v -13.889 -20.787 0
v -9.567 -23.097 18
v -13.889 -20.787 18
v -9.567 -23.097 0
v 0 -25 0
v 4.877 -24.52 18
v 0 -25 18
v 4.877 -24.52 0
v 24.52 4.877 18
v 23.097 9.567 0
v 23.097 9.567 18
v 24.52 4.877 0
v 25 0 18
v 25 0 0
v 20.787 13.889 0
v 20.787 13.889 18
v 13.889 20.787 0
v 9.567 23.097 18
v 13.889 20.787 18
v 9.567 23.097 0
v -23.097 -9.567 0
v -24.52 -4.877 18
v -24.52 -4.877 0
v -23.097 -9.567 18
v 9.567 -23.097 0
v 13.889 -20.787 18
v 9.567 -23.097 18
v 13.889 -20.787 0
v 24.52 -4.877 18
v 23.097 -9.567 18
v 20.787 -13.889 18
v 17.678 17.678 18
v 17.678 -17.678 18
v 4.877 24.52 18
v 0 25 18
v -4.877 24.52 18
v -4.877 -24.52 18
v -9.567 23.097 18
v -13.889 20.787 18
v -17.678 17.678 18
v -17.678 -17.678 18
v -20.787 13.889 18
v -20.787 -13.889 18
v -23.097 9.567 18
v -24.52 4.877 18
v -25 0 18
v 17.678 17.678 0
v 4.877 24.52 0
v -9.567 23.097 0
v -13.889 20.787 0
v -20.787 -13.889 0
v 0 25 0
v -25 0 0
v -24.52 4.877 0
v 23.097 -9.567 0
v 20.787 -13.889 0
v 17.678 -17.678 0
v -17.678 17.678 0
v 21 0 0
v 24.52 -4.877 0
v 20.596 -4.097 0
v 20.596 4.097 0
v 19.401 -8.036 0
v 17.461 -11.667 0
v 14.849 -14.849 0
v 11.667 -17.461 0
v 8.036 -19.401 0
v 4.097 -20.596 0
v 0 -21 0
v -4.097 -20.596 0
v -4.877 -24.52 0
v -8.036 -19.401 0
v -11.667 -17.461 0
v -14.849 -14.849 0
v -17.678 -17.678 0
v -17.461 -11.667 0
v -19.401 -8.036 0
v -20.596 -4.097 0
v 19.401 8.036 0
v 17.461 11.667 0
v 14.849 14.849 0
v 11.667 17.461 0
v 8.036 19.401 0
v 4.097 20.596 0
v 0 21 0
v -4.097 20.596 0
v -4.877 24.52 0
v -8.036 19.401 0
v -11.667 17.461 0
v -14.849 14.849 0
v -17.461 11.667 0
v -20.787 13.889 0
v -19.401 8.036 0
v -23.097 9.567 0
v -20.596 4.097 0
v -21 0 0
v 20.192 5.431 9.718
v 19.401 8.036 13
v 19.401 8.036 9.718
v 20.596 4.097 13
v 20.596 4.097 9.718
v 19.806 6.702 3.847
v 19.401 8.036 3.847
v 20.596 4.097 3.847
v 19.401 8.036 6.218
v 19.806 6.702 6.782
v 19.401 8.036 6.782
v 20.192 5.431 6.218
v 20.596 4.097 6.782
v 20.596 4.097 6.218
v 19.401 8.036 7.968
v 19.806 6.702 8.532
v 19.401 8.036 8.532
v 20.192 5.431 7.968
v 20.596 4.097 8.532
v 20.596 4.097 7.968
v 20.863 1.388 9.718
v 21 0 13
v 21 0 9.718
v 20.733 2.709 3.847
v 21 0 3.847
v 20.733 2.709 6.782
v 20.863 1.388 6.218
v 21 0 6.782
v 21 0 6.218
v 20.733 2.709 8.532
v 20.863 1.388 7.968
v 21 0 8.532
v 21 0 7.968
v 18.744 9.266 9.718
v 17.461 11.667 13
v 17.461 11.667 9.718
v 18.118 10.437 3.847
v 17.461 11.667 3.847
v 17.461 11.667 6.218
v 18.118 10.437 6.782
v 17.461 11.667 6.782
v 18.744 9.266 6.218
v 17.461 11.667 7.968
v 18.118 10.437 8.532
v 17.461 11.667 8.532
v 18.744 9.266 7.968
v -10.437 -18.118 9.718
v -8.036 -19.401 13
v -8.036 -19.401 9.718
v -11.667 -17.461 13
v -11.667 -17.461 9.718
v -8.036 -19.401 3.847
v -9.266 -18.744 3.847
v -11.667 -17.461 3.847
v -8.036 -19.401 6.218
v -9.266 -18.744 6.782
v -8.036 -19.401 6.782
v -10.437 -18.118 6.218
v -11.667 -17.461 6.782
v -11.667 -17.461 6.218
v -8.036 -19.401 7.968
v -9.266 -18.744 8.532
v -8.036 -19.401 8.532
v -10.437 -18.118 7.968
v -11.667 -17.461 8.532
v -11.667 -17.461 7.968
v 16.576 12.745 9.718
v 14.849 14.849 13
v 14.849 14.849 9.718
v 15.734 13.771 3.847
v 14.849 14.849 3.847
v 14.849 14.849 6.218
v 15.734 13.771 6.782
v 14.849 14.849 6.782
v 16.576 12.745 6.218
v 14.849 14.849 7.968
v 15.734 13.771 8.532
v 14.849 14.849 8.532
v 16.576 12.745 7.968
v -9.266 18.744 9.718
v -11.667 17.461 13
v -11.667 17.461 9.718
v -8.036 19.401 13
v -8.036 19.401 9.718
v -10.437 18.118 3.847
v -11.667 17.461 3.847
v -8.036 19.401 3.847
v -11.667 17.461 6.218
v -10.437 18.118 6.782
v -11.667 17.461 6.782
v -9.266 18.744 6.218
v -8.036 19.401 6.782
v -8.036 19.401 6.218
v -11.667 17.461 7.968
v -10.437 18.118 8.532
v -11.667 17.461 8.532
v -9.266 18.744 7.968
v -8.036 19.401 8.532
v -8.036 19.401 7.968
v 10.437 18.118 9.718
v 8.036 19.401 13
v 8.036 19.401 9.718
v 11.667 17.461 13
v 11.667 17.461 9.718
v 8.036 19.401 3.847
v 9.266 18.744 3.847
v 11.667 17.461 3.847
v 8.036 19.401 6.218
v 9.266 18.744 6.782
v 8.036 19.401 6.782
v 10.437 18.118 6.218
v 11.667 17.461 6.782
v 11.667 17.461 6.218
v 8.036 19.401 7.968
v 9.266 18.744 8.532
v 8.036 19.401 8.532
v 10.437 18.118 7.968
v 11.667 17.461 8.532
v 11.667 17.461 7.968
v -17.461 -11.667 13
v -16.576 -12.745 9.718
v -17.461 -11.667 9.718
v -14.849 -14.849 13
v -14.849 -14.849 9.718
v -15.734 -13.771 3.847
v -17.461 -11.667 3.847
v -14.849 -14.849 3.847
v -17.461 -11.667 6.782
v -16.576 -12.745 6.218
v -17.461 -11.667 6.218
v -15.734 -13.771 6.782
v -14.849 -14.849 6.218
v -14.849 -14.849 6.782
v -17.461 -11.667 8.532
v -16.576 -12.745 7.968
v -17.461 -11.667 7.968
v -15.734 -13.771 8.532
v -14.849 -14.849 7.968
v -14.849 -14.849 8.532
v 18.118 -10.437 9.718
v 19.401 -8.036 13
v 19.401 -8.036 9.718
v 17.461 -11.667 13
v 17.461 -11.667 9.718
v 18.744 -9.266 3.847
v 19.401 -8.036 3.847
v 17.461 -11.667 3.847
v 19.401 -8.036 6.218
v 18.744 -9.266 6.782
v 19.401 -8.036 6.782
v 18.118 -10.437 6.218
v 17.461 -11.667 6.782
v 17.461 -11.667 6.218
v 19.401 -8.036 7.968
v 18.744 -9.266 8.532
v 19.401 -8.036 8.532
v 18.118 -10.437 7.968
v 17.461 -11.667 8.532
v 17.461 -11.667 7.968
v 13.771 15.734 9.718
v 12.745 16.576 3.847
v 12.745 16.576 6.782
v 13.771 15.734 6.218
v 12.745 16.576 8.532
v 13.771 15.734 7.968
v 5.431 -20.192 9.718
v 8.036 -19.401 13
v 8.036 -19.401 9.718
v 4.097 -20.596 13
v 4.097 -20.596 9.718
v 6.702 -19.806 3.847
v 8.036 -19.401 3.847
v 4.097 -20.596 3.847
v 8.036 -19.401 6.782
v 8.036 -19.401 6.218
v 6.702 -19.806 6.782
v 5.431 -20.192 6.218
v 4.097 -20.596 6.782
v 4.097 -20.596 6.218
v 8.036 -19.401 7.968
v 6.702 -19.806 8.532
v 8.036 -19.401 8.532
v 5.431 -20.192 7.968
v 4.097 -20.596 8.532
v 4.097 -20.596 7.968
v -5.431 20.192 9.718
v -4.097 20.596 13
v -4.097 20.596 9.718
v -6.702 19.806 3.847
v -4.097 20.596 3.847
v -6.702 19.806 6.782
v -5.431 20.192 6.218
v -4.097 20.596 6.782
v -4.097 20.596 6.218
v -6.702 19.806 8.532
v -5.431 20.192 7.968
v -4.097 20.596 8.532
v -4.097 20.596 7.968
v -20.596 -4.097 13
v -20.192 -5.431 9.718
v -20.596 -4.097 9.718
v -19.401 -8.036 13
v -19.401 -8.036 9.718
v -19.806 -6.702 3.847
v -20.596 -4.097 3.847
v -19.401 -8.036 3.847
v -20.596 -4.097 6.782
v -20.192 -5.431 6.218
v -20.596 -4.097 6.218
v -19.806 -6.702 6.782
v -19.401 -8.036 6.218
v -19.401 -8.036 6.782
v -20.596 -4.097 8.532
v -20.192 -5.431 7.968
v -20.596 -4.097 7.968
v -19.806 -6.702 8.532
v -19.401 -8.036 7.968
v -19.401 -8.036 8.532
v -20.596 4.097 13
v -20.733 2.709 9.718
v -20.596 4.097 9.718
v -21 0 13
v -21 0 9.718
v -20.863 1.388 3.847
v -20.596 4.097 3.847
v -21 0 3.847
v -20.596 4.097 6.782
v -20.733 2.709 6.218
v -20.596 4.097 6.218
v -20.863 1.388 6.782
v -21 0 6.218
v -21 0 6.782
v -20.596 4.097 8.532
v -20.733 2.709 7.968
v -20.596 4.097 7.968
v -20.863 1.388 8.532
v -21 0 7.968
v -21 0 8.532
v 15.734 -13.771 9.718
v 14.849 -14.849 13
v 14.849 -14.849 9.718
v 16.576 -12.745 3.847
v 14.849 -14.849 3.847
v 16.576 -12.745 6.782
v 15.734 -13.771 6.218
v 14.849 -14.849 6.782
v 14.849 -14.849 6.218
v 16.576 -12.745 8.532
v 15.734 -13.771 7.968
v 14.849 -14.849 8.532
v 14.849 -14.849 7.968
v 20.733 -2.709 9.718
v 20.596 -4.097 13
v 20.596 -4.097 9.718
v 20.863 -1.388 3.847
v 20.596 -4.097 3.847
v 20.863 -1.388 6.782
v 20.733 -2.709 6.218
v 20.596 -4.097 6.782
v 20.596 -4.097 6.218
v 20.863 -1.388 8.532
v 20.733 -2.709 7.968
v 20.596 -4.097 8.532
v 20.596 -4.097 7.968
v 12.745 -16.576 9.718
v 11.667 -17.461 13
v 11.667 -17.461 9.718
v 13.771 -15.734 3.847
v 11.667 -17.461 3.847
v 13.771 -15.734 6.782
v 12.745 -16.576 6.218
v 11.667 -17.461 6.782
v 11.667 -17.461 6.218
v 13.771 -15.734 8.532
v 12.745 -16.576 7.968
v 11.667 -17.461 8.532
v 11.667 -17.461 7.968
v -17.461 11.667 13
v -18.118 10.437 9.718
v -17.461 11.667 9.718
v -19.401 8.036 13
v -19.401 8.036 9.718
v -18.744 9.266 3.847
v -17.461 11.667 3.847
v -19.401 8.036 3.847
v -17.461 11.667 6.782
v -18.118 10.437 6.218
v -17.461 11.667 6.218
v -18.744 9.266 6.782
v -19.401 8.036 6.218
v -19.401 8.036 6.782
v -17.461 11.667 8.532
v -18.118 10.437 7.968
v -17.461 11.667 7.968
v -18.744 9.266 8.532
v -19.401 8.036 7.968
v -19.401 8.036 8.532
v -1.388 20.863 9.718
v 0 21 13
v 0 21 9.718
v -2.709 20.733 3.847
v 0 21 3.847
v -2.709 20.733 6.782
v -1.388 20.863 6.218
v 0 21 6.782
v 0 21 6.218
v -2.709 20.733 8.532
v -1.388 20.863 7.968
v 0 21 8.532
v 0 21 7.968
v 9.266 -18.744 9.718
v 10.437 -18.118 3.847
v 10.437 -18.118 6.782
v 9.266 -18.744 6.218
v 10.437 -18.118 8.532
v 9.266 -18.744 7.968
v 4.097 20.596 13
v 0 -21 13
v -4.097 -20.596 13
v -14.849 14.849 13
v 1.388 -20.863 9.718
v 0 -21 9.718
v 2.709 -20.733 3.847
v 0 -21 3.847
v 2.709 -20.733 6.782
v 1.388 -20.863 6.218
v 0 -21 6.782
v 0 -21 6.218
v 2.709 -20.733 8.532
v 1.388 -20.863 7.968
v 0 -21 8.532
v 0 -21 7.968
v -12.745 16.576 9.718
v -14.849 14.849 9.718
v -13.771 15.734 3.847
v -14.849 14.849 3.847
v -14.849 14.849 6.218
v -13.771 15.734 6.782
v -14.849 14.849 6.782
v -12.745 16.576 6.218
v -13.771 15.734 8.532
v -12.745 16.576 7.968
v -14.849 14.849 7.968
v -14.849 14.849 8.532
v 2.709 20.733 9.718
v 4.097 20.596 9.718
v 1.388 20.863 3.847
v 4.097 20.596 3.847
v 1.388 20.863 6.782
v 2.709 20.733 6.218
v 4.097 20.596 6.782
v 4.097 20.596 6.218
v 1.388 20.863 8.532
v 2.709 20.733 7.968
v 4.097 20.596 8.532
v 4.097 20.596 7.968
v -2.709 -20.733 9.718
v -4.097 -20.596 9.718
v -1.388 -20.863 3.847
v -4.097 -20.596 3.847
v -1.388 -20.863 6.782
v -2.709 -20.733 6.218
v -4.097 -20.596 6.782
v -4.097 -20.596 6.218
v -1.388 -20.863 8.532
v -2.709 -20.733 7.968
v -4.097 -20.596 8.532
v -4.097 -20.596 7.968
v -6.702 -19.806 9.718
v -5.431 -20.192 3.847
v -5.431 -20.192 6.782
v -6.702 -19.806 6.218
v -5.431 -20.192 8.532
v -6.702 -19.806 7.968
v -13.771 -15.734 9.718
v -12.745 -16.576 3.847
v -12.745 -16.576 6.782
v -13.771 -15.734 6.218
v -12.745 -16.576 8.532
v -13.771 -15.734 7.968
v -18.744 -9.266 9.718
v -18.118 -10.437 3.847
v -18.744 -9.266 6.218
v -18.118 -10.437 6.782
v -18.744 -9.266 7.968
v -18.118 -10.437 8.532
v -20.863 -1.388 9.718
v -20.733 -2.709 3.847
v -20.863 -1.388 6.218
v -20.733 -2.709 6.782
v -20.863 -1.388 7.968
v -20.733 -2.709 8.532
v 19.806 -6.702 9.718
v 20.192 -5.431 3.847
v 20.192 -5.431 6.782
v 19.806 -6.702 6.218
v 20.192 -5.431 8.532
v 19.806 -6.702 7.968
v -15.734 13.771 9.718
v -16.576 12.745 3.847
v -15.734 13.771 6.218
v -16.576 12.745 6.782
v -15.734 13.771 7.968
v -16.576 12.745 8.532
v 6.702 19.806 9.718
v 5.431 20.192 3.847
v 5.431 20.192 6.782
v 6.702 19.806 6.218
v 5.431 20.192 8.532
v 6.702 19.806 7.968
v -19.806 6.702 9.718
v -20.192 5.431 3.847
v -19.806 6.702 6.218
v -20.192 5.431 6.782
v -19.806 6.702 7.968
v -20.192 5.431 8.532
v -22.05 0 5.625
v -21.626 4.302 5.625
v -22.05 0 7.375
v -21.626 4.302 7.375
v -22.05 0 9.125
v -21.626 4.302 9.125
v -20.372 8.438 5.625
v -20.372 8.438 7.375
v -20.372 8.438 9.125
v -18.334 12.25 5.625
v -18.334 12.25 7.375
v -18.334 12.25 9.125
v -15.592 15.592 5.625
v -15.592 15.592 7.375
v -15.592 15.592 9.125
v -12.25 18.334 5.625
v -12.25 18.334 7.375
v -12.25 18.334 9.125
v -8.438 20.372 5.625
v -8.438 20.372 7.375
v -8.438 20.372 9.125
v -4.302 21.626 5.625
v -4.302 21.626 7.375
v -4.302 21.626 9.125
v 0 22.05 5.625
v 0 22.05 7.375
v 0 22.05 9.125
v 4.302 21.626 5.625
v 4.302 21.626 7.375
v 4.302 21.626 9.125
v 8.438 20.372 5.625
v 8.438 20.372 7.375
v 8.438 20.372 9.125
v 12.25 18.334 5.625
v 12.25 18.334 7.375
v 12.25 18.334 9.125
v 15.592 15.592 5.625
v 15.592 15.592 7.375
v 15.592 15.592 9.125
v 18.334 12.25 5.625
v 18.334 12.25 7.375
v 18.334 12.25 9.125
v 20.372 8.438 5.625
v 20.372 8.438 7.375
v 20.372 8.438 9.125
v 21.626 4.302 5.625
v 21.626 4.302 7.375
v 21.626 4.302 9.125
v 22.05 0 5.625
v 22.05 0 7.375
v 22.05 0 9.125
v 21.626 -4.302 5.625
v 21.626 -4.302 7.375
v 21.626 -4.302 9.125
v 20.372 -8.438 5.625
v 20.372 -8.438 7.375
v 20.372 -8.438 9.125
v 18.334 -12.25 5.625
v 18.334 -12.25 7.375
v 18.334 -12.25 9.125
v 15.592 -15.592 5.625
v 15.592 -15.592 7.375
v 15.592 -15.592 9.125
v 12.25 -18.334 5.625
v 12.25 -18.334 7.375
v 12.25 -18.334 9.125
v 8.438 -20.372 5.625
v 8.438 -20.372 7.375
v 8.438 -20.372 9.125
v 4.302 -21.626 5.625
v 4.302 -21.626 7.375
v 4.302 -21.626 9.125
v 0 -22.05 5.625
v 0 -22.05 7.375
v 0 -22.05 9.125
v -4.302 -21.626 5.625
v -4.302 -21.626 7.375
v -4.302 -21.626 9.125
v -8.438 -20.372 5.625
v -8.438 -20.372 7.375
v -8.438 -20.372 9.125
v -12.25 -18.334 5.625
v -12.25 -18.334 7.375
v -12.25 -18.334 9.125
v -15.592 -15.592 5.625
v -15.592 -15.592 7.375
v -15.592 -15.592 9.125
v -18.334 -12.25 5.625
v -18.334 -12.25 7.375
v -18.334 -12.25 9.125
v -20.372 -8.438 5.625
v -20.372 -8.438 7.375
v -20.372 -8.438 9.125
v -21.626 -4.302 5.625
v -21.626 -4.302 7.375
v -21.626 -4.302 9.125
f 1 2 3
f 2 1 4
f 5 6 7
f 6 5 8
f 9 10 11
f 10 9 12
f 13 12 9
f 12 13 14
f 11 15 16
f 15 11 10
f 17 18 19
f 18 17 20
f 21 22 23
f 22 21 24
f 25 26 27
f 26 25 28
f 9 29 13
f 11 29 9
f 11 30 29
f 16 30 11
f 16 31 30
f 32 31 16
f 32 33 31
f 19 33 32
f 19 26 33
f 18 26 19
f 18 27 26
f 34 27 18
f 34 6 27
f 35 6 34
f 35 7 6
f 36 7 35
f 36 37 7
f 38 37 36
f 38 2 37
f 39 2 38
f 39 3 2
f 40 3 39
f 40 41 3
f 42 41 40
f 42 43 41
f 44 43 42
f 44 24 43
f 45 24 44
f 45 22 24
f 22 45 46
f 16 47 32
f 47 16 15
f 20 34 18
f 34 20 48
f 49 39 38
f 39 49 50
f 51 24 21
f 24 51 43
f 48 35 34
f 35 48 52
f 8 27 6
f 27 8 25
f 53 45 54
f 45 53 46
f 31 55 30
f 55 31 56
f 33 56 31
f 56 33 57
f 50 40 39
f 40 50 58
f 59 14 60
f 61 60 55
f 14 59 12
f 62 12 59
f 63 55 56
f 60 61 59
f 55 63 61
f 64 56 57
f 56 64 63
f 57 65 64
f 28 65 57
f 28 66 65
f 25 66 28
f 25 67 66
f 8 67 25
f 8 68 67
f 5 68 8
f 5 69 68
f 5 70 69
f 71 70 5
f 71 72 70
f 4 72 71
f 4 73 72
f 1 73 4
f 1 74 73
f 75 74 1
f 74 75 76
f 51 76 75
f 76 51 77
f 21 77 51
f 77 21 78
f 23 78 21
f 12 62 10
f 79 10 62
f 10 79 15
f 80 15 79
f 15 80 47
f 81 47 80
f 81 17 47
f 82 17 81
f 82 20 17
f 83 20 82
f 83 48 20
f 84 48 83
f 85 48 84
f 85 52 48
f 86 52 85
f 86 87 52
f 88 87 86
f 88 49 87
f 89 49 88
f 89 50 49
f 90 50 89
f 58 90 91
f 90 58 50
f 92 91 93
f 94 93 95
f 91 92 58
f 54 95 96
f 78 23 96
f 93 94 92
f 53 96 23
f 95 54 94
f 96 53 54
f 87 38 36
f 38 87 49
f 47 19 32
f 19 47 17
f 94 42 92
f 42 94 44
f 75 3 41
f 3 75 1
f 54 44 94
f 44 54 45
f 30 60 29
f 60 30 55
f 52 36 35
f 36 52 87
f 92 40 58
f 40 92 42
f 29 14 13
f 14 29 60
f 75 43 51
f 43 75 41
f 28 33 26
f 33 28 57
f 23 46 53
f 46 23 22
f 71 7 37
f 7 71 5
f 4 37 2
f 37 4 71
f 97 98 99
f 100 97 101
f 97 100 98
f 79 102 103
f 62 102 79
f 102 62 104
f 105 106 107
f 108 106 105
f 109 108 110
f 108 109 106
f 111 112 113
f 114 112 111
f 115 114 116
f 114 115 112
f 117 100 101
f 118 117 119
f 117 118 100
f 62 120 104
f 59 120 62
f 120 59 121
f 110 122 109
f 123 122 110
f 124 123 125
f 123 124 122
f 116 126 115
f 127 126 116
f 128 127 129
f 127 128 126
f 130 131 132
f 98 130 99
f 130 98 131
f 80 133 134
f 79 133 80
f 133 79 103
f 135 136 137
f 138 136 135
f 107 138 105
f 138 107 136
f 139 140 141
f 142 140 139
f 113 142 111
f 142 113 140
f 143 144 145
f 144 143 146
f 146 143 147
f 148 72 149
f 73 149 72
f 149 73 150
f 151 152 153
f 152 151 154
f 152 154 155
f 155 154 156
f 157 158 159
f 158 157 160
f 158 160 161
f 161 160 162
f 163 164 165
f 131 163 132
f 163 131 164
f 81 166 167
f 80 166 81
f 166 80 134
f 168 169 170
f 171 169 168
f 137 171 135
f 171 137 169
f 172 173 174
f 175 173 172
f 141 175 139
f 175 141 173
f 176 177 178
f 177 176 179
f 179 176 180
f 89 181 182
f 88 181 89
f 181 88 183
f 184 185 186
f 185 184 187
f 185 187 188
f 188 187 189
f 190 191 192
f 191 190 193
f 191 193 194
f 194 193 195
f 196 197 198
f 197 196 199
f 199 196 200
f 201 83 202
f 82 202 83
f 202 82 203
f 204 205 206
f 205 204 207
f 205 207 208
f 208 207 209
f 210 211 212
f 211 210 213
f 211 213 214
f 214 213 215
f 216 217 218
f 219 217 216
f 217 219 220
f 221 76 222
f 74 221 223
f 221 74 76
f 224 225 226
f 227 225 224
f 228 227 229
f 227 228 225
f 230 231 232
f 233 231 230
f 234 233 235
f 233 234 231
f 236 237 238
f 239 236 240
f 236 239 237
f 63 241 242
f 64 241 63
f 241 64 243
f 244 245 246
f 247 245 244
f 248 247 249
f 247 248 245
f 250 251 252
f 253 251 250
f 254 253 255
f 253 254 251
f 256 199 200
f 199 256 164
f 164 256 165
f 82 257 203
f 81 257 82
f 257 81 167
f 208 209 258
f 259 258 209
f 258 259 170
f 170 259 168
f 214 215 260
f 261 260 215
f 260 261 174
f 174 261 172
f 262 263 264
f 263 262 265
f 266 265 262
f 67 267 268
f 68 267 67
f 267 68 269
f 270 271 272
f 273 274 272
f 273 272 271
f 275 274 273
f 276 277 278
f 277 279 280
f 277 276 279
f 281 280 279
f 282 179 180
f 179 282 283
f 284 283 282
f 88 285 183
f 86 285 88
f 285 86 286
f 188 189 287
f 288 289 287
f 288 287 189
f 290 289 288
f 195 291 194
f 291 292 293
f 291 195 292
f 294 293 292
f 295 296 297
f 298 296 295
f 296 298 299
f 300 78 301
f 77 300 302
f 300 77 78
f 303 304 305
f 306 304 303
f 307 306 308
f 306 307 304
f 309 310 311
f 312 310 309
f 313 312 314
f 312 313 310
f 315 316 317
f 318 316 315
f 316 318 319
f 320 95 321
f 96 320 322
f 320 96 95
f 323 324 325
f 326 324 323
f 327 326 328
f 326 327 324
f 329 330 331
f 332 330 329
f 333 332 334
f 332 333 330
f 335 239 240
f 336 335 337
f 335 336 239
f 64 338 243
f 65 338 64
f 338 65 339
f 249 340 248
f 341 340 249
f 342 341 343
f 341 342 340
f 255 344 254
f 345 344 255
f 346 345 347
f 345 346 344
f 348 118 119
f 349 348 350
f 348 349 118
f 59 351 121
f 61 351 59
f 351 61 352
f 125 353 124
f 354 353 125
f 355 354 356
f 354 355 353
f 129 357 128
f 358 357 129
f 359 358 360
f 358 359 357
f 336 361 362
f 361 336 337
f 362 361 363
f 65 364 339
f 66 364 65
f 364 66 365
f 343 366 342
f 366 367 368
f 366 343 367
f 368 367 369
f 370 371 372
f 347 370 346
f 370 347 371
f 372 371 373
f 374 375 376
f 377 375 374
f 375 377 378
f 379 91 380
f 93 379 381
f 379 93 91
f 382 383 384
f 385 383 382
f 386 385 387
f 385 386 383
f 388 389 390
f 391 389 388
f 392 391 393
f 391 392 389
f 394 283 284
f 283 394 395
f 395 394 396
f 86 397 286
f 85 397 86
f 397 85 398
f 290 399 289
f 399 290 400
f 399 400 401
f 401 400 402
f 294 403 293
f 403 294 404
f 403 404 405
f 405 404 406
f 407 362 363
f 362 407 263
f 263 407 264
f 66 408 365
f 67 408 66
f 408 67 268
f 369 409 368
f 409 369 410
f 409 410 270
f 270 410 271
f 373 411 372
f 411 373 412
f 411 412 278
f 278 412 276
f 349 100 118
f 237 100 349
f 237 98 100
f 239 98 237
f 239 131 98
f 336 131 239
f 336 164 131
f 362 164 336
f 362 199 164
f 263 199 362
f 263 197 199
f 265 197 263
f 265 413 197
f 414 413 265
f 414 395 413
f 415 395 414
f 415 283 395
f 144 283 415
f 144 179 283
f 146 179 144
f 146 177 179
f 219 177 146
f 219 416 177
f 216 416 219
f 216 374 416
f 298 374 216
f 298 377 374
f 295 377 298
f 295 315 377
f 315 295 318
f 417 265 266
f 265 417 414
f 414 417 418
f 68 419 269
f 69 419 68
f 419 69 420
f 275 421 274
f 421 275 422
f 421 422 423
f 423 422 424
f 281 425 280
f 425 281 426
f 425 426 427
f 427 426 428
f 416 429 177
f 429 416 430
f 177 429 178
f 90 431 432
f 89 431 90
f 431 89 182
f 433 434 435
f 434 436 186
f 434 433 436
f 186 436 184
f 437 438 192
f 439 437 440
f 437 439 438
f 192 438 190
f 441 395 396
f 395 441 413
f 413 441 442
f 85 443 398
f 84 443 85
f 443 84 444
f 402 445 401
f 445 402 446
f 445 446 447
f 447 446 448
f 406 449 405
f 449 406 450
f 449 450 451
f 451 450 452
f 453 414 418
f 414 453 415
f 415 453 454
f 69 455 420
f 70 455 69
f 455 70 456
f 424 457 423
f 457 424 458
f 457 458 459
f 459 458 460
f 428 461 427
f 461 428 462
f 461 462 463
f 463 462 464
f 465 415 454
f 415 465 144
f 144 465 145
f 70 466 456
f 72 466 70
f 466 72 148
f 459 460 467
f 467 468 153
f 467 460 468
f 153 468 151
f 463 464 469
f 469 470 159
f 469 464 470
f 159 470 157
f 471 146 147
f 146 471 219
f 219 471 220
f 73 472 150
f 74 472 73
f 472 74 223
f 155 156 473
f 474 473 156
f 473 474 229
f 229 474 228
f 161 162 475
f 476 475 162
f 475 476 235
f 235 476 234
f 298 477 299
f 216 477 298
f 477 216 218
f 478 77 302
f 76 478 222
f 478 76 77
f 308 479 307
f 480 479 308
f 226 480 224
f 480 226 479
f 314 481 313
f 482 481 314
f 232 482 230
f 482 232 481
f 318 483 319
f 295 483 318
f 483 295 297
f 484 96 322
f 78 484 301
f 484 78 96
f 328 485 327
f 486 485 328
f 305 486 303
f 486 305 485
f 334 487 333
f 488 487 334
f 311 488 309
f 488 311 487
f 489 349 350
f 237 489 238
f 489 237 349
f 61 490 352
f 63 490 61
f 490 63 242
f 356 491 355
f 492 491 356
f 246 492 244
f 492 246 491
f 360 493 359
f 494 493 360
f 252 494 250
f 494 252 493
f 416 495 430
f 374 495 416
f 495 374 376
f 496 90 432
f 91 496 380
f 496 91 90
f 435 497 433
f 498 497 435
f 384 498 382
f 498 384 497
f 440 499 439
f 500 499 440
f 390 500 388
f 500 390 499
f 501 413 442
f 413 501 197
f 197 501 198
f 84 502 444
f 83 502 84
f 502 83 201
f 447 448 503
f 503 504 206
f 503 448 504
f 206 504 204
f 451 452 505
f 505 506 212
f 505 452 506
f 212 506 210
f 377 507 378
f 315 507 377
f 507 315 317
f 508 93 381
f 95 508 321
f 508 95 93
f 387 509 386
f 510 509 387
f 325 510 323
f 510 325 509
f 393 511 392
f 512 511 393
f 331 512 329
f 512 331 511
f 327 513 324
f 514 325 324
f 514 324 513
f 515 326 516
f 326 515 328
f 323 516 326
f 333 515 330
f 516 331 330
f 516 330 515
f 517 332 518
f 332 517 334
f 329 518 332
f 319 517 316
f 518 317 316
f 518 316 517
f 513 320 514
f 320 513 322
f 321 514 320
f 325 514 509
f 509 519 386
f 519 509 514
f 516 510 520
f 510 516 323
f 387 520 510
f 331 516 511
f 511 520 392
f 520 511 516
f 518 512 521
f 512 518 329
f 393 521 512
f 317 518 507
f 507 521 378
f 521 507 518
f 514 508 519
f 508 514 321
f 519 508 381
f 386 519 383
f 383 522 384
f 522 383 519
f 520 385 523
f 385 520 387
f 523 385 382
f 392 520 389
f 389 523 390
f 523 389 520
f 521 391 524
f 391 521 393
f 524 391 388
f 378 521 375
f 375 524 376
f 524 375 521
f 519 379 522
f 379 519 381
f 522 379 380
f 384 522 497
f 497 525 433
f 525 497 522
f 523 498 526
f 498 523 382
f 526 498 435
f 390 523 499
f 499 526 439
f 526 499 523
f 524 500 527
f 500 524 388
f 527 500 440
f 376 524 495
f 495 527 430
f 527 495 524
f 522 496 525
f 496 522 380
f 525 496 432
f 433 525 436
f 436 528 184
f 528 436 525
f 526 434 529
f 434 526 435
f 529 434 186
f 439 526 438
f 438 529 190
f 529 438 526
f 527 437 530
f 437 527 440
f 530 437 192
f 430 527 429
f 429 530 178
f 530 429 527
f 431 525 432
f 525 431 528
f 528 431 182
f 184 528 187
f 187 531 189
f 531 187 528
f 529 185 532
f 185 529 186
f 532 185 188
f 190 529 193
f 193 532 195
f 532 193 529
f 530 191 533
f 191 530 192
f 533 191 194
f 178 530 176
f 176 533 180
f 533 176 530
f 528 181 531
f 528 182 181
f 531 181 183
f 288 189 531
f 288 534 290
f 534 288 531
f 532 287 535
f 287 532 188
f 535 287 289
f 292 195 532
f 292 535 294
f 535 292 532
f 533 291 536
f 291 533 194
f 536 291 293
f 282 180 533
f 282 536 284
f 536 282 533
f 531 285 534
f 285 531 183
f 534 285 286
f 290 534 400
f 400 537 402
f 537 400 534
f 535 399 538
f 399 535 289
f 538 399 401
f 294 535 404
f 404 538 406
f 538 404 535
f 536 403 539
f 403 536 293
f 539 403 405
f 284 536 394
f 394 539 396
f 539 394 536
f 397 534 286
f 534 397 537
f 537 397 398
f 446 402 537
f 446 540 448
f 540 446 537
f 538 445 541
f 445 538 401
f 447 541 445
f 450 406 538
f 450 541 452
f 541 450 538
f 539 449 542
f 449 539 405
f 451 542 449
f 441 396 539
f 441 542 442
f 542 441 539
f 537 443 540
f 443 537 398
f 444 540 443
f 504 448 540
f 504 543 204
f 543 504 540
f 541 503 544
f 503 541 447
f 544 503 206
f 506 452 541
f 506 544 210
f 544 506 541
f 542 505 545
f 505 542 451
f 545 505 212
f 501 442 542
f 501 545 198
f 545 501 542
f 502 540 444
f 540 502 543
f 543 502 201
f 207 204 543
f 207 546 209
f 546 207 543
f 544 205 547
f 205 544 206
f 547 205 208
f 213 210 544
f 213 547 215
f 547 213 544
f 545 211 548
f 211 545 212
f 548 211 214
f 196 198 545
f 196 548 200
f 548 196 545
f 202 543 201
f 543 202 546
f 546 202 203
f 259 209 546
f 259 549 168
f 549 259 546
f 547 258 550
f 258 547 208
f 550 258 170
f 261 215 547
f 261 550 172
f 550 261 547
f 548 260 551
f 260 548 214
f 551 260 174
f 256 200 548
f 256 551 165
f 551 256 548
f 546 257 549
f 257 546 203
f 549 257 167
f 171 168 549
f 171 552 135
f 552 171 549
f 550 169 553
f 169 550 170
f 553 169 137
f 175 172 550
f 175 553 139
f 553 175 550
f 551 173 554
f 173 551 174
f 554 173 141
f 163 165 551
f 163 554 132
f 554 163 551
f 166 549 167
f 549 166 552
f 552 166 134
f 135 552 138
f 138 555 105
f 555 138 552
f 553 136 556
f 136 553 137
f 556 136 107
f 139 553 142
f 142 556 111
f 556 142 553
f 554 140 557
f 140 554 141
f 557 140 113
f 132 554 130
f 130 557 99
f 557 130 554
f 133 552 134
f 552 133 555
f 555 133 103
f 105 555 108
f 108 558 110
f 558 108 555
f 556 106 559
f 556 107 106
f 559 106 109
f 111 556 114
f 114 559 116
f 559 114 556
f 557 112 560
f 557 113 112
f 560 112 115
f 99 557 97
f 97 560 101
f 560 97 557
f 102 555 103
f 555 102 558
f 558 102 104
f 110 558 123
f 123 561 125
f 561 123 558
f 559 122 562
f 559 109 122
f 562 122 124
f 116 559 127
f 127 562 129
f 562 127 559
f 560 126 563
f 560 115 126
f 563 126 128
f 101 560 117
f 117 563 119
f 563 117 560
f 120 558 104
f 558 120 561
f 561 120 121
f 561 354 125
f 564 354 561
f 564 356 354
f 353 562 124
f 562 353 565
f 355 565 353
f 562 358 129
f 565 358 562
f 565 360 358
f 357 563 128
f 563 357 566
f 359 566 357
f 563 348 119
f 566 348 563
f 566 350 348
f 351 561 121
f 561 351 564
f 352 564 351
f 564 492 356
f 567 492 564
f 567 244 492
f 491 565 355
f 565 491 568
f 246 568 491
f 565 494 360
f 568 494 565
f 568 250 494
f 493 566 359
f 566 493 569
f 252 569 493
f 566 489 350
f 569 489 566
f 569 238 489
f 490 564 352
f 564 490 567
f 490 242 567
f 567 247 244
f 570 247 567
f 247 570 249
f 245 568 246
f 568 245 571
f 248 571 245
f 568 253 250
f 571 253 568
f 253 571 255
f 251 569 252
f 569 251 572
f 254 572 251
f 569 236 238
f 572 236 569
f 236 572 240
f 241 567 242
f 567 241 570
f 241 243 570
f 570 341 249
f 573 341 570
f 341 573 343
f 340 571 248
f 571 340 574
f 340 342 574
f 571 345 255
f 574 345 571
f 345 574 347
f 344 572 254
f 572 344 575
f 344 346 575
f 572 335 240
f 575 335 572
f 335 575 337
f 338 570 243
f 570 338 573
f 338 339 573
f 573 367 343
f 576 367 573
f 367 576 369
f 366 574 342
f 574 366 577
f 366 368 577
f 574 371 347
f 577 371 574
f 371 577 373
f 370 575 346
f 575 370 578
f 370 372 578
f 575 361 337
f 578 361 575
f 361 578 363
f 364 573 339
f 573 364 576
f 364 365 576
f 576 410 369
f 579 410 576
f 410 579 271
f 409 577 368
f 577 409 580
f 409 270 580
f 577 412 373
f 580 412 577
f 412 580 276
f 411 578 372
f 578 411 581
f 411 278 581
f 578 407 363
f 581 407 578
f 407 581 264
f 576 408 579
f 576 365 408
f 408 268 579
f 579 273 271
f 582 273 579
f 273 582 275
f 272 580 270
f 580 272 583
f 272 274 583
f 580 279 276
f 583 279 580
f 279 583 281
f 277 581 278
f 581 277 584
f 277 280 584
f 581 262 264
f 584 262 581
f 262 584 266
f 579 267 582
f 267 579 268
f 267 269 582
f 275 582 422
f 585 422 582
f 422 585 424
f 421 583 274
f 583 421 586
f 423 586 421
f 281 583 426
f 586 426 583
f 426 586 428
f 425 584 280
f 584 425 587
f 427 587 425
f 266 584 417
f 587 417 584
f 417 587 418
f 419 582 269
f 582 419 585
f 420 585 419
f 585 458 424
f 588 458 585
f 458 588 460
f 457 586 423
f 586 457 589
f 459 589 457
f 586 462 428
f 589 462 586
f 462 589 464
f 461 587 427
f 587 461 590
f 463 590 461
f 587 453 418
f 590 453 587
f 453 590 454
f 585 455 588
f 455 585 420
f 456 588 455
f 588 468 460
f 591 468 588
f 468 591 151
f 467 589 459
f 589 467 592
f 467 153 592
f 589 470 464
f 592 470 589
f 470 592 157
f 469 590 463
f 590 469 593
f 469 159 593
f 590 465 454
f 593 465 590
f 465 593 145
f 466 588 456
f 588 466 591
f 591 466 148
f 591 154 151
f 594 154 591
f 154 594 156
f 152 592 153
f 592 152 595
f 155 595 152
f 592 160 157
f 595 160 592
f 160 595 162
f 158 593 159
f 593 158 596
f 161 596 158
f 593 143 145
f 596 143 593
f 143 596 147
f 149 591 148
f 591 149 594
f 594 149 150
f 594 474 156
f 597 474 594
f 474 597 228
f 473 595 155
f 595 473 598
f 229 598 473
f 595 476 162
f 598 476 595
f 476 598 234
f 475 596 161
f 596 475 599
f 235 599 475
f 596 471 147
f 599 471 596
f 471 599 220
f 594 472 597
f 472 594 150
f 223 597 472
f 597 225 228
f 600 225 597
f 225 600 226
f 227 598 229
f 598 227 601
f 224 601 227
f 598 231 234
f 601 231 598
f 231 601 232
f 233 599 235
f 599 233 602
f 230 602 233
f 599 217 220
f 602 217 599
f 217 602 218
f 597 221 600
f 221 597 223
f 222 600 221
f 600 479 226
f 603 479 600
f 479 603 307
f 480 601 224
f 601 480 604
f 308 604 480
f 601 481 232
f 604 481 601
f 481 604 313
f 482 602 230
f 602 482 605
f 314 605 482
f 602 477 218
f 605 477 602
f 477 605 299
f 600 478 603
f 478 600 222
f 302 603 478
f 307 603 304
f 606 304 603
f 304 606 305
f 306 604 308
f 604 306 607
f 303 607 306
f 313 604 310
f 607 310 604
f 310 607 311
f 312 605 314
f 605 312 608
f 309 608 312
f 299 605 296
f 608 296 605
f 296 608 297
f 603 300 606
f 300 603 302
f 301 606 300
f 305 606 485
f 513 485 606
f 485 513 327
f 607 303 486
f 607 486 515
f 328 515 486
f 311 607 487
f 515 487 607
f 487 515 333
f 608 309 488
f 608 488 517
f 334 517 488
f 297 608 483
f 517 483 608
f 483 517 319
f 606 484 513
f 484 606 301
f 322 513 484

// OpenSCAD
$fn = 32;

// ----------------------------------------------------------------------
// Threaded cap: 50 mm body, 18 mm tall, 42 mm threaded bore
// ----------------------------------------------------------------------

// --- parameters (mm) ---
outer_d = 50;             // cap outside diameter
body_h = 18;              // cap height
top_t = 5;                // closed top thickness
bore_d = 42;              // bore core diameter
pitch = 1.75;             // thread pitch
thread_d = 1.05;          // thread depth
thread_z = 3;             // thread start above the rim
thread_h = 7;             // threaded height

difference() {
  union() {
    cylinder(h = 18, d = outer_d);
  }
  /* threaded bore, closed at the top */
  translate([0, 0, -2.5]) cylinder(h = 15.5, d = bore_d);
  translate([0, 0, 3]) rotate_extrude() polygon([[20, 0], [20, 7], [20.5, 7], [22.05, 6.125], [20.5, 5.25], [22.05, 4.375], [20.5, 3.5], [22.05, 2.625], [20.5, 0], [20, 0]]);
}
